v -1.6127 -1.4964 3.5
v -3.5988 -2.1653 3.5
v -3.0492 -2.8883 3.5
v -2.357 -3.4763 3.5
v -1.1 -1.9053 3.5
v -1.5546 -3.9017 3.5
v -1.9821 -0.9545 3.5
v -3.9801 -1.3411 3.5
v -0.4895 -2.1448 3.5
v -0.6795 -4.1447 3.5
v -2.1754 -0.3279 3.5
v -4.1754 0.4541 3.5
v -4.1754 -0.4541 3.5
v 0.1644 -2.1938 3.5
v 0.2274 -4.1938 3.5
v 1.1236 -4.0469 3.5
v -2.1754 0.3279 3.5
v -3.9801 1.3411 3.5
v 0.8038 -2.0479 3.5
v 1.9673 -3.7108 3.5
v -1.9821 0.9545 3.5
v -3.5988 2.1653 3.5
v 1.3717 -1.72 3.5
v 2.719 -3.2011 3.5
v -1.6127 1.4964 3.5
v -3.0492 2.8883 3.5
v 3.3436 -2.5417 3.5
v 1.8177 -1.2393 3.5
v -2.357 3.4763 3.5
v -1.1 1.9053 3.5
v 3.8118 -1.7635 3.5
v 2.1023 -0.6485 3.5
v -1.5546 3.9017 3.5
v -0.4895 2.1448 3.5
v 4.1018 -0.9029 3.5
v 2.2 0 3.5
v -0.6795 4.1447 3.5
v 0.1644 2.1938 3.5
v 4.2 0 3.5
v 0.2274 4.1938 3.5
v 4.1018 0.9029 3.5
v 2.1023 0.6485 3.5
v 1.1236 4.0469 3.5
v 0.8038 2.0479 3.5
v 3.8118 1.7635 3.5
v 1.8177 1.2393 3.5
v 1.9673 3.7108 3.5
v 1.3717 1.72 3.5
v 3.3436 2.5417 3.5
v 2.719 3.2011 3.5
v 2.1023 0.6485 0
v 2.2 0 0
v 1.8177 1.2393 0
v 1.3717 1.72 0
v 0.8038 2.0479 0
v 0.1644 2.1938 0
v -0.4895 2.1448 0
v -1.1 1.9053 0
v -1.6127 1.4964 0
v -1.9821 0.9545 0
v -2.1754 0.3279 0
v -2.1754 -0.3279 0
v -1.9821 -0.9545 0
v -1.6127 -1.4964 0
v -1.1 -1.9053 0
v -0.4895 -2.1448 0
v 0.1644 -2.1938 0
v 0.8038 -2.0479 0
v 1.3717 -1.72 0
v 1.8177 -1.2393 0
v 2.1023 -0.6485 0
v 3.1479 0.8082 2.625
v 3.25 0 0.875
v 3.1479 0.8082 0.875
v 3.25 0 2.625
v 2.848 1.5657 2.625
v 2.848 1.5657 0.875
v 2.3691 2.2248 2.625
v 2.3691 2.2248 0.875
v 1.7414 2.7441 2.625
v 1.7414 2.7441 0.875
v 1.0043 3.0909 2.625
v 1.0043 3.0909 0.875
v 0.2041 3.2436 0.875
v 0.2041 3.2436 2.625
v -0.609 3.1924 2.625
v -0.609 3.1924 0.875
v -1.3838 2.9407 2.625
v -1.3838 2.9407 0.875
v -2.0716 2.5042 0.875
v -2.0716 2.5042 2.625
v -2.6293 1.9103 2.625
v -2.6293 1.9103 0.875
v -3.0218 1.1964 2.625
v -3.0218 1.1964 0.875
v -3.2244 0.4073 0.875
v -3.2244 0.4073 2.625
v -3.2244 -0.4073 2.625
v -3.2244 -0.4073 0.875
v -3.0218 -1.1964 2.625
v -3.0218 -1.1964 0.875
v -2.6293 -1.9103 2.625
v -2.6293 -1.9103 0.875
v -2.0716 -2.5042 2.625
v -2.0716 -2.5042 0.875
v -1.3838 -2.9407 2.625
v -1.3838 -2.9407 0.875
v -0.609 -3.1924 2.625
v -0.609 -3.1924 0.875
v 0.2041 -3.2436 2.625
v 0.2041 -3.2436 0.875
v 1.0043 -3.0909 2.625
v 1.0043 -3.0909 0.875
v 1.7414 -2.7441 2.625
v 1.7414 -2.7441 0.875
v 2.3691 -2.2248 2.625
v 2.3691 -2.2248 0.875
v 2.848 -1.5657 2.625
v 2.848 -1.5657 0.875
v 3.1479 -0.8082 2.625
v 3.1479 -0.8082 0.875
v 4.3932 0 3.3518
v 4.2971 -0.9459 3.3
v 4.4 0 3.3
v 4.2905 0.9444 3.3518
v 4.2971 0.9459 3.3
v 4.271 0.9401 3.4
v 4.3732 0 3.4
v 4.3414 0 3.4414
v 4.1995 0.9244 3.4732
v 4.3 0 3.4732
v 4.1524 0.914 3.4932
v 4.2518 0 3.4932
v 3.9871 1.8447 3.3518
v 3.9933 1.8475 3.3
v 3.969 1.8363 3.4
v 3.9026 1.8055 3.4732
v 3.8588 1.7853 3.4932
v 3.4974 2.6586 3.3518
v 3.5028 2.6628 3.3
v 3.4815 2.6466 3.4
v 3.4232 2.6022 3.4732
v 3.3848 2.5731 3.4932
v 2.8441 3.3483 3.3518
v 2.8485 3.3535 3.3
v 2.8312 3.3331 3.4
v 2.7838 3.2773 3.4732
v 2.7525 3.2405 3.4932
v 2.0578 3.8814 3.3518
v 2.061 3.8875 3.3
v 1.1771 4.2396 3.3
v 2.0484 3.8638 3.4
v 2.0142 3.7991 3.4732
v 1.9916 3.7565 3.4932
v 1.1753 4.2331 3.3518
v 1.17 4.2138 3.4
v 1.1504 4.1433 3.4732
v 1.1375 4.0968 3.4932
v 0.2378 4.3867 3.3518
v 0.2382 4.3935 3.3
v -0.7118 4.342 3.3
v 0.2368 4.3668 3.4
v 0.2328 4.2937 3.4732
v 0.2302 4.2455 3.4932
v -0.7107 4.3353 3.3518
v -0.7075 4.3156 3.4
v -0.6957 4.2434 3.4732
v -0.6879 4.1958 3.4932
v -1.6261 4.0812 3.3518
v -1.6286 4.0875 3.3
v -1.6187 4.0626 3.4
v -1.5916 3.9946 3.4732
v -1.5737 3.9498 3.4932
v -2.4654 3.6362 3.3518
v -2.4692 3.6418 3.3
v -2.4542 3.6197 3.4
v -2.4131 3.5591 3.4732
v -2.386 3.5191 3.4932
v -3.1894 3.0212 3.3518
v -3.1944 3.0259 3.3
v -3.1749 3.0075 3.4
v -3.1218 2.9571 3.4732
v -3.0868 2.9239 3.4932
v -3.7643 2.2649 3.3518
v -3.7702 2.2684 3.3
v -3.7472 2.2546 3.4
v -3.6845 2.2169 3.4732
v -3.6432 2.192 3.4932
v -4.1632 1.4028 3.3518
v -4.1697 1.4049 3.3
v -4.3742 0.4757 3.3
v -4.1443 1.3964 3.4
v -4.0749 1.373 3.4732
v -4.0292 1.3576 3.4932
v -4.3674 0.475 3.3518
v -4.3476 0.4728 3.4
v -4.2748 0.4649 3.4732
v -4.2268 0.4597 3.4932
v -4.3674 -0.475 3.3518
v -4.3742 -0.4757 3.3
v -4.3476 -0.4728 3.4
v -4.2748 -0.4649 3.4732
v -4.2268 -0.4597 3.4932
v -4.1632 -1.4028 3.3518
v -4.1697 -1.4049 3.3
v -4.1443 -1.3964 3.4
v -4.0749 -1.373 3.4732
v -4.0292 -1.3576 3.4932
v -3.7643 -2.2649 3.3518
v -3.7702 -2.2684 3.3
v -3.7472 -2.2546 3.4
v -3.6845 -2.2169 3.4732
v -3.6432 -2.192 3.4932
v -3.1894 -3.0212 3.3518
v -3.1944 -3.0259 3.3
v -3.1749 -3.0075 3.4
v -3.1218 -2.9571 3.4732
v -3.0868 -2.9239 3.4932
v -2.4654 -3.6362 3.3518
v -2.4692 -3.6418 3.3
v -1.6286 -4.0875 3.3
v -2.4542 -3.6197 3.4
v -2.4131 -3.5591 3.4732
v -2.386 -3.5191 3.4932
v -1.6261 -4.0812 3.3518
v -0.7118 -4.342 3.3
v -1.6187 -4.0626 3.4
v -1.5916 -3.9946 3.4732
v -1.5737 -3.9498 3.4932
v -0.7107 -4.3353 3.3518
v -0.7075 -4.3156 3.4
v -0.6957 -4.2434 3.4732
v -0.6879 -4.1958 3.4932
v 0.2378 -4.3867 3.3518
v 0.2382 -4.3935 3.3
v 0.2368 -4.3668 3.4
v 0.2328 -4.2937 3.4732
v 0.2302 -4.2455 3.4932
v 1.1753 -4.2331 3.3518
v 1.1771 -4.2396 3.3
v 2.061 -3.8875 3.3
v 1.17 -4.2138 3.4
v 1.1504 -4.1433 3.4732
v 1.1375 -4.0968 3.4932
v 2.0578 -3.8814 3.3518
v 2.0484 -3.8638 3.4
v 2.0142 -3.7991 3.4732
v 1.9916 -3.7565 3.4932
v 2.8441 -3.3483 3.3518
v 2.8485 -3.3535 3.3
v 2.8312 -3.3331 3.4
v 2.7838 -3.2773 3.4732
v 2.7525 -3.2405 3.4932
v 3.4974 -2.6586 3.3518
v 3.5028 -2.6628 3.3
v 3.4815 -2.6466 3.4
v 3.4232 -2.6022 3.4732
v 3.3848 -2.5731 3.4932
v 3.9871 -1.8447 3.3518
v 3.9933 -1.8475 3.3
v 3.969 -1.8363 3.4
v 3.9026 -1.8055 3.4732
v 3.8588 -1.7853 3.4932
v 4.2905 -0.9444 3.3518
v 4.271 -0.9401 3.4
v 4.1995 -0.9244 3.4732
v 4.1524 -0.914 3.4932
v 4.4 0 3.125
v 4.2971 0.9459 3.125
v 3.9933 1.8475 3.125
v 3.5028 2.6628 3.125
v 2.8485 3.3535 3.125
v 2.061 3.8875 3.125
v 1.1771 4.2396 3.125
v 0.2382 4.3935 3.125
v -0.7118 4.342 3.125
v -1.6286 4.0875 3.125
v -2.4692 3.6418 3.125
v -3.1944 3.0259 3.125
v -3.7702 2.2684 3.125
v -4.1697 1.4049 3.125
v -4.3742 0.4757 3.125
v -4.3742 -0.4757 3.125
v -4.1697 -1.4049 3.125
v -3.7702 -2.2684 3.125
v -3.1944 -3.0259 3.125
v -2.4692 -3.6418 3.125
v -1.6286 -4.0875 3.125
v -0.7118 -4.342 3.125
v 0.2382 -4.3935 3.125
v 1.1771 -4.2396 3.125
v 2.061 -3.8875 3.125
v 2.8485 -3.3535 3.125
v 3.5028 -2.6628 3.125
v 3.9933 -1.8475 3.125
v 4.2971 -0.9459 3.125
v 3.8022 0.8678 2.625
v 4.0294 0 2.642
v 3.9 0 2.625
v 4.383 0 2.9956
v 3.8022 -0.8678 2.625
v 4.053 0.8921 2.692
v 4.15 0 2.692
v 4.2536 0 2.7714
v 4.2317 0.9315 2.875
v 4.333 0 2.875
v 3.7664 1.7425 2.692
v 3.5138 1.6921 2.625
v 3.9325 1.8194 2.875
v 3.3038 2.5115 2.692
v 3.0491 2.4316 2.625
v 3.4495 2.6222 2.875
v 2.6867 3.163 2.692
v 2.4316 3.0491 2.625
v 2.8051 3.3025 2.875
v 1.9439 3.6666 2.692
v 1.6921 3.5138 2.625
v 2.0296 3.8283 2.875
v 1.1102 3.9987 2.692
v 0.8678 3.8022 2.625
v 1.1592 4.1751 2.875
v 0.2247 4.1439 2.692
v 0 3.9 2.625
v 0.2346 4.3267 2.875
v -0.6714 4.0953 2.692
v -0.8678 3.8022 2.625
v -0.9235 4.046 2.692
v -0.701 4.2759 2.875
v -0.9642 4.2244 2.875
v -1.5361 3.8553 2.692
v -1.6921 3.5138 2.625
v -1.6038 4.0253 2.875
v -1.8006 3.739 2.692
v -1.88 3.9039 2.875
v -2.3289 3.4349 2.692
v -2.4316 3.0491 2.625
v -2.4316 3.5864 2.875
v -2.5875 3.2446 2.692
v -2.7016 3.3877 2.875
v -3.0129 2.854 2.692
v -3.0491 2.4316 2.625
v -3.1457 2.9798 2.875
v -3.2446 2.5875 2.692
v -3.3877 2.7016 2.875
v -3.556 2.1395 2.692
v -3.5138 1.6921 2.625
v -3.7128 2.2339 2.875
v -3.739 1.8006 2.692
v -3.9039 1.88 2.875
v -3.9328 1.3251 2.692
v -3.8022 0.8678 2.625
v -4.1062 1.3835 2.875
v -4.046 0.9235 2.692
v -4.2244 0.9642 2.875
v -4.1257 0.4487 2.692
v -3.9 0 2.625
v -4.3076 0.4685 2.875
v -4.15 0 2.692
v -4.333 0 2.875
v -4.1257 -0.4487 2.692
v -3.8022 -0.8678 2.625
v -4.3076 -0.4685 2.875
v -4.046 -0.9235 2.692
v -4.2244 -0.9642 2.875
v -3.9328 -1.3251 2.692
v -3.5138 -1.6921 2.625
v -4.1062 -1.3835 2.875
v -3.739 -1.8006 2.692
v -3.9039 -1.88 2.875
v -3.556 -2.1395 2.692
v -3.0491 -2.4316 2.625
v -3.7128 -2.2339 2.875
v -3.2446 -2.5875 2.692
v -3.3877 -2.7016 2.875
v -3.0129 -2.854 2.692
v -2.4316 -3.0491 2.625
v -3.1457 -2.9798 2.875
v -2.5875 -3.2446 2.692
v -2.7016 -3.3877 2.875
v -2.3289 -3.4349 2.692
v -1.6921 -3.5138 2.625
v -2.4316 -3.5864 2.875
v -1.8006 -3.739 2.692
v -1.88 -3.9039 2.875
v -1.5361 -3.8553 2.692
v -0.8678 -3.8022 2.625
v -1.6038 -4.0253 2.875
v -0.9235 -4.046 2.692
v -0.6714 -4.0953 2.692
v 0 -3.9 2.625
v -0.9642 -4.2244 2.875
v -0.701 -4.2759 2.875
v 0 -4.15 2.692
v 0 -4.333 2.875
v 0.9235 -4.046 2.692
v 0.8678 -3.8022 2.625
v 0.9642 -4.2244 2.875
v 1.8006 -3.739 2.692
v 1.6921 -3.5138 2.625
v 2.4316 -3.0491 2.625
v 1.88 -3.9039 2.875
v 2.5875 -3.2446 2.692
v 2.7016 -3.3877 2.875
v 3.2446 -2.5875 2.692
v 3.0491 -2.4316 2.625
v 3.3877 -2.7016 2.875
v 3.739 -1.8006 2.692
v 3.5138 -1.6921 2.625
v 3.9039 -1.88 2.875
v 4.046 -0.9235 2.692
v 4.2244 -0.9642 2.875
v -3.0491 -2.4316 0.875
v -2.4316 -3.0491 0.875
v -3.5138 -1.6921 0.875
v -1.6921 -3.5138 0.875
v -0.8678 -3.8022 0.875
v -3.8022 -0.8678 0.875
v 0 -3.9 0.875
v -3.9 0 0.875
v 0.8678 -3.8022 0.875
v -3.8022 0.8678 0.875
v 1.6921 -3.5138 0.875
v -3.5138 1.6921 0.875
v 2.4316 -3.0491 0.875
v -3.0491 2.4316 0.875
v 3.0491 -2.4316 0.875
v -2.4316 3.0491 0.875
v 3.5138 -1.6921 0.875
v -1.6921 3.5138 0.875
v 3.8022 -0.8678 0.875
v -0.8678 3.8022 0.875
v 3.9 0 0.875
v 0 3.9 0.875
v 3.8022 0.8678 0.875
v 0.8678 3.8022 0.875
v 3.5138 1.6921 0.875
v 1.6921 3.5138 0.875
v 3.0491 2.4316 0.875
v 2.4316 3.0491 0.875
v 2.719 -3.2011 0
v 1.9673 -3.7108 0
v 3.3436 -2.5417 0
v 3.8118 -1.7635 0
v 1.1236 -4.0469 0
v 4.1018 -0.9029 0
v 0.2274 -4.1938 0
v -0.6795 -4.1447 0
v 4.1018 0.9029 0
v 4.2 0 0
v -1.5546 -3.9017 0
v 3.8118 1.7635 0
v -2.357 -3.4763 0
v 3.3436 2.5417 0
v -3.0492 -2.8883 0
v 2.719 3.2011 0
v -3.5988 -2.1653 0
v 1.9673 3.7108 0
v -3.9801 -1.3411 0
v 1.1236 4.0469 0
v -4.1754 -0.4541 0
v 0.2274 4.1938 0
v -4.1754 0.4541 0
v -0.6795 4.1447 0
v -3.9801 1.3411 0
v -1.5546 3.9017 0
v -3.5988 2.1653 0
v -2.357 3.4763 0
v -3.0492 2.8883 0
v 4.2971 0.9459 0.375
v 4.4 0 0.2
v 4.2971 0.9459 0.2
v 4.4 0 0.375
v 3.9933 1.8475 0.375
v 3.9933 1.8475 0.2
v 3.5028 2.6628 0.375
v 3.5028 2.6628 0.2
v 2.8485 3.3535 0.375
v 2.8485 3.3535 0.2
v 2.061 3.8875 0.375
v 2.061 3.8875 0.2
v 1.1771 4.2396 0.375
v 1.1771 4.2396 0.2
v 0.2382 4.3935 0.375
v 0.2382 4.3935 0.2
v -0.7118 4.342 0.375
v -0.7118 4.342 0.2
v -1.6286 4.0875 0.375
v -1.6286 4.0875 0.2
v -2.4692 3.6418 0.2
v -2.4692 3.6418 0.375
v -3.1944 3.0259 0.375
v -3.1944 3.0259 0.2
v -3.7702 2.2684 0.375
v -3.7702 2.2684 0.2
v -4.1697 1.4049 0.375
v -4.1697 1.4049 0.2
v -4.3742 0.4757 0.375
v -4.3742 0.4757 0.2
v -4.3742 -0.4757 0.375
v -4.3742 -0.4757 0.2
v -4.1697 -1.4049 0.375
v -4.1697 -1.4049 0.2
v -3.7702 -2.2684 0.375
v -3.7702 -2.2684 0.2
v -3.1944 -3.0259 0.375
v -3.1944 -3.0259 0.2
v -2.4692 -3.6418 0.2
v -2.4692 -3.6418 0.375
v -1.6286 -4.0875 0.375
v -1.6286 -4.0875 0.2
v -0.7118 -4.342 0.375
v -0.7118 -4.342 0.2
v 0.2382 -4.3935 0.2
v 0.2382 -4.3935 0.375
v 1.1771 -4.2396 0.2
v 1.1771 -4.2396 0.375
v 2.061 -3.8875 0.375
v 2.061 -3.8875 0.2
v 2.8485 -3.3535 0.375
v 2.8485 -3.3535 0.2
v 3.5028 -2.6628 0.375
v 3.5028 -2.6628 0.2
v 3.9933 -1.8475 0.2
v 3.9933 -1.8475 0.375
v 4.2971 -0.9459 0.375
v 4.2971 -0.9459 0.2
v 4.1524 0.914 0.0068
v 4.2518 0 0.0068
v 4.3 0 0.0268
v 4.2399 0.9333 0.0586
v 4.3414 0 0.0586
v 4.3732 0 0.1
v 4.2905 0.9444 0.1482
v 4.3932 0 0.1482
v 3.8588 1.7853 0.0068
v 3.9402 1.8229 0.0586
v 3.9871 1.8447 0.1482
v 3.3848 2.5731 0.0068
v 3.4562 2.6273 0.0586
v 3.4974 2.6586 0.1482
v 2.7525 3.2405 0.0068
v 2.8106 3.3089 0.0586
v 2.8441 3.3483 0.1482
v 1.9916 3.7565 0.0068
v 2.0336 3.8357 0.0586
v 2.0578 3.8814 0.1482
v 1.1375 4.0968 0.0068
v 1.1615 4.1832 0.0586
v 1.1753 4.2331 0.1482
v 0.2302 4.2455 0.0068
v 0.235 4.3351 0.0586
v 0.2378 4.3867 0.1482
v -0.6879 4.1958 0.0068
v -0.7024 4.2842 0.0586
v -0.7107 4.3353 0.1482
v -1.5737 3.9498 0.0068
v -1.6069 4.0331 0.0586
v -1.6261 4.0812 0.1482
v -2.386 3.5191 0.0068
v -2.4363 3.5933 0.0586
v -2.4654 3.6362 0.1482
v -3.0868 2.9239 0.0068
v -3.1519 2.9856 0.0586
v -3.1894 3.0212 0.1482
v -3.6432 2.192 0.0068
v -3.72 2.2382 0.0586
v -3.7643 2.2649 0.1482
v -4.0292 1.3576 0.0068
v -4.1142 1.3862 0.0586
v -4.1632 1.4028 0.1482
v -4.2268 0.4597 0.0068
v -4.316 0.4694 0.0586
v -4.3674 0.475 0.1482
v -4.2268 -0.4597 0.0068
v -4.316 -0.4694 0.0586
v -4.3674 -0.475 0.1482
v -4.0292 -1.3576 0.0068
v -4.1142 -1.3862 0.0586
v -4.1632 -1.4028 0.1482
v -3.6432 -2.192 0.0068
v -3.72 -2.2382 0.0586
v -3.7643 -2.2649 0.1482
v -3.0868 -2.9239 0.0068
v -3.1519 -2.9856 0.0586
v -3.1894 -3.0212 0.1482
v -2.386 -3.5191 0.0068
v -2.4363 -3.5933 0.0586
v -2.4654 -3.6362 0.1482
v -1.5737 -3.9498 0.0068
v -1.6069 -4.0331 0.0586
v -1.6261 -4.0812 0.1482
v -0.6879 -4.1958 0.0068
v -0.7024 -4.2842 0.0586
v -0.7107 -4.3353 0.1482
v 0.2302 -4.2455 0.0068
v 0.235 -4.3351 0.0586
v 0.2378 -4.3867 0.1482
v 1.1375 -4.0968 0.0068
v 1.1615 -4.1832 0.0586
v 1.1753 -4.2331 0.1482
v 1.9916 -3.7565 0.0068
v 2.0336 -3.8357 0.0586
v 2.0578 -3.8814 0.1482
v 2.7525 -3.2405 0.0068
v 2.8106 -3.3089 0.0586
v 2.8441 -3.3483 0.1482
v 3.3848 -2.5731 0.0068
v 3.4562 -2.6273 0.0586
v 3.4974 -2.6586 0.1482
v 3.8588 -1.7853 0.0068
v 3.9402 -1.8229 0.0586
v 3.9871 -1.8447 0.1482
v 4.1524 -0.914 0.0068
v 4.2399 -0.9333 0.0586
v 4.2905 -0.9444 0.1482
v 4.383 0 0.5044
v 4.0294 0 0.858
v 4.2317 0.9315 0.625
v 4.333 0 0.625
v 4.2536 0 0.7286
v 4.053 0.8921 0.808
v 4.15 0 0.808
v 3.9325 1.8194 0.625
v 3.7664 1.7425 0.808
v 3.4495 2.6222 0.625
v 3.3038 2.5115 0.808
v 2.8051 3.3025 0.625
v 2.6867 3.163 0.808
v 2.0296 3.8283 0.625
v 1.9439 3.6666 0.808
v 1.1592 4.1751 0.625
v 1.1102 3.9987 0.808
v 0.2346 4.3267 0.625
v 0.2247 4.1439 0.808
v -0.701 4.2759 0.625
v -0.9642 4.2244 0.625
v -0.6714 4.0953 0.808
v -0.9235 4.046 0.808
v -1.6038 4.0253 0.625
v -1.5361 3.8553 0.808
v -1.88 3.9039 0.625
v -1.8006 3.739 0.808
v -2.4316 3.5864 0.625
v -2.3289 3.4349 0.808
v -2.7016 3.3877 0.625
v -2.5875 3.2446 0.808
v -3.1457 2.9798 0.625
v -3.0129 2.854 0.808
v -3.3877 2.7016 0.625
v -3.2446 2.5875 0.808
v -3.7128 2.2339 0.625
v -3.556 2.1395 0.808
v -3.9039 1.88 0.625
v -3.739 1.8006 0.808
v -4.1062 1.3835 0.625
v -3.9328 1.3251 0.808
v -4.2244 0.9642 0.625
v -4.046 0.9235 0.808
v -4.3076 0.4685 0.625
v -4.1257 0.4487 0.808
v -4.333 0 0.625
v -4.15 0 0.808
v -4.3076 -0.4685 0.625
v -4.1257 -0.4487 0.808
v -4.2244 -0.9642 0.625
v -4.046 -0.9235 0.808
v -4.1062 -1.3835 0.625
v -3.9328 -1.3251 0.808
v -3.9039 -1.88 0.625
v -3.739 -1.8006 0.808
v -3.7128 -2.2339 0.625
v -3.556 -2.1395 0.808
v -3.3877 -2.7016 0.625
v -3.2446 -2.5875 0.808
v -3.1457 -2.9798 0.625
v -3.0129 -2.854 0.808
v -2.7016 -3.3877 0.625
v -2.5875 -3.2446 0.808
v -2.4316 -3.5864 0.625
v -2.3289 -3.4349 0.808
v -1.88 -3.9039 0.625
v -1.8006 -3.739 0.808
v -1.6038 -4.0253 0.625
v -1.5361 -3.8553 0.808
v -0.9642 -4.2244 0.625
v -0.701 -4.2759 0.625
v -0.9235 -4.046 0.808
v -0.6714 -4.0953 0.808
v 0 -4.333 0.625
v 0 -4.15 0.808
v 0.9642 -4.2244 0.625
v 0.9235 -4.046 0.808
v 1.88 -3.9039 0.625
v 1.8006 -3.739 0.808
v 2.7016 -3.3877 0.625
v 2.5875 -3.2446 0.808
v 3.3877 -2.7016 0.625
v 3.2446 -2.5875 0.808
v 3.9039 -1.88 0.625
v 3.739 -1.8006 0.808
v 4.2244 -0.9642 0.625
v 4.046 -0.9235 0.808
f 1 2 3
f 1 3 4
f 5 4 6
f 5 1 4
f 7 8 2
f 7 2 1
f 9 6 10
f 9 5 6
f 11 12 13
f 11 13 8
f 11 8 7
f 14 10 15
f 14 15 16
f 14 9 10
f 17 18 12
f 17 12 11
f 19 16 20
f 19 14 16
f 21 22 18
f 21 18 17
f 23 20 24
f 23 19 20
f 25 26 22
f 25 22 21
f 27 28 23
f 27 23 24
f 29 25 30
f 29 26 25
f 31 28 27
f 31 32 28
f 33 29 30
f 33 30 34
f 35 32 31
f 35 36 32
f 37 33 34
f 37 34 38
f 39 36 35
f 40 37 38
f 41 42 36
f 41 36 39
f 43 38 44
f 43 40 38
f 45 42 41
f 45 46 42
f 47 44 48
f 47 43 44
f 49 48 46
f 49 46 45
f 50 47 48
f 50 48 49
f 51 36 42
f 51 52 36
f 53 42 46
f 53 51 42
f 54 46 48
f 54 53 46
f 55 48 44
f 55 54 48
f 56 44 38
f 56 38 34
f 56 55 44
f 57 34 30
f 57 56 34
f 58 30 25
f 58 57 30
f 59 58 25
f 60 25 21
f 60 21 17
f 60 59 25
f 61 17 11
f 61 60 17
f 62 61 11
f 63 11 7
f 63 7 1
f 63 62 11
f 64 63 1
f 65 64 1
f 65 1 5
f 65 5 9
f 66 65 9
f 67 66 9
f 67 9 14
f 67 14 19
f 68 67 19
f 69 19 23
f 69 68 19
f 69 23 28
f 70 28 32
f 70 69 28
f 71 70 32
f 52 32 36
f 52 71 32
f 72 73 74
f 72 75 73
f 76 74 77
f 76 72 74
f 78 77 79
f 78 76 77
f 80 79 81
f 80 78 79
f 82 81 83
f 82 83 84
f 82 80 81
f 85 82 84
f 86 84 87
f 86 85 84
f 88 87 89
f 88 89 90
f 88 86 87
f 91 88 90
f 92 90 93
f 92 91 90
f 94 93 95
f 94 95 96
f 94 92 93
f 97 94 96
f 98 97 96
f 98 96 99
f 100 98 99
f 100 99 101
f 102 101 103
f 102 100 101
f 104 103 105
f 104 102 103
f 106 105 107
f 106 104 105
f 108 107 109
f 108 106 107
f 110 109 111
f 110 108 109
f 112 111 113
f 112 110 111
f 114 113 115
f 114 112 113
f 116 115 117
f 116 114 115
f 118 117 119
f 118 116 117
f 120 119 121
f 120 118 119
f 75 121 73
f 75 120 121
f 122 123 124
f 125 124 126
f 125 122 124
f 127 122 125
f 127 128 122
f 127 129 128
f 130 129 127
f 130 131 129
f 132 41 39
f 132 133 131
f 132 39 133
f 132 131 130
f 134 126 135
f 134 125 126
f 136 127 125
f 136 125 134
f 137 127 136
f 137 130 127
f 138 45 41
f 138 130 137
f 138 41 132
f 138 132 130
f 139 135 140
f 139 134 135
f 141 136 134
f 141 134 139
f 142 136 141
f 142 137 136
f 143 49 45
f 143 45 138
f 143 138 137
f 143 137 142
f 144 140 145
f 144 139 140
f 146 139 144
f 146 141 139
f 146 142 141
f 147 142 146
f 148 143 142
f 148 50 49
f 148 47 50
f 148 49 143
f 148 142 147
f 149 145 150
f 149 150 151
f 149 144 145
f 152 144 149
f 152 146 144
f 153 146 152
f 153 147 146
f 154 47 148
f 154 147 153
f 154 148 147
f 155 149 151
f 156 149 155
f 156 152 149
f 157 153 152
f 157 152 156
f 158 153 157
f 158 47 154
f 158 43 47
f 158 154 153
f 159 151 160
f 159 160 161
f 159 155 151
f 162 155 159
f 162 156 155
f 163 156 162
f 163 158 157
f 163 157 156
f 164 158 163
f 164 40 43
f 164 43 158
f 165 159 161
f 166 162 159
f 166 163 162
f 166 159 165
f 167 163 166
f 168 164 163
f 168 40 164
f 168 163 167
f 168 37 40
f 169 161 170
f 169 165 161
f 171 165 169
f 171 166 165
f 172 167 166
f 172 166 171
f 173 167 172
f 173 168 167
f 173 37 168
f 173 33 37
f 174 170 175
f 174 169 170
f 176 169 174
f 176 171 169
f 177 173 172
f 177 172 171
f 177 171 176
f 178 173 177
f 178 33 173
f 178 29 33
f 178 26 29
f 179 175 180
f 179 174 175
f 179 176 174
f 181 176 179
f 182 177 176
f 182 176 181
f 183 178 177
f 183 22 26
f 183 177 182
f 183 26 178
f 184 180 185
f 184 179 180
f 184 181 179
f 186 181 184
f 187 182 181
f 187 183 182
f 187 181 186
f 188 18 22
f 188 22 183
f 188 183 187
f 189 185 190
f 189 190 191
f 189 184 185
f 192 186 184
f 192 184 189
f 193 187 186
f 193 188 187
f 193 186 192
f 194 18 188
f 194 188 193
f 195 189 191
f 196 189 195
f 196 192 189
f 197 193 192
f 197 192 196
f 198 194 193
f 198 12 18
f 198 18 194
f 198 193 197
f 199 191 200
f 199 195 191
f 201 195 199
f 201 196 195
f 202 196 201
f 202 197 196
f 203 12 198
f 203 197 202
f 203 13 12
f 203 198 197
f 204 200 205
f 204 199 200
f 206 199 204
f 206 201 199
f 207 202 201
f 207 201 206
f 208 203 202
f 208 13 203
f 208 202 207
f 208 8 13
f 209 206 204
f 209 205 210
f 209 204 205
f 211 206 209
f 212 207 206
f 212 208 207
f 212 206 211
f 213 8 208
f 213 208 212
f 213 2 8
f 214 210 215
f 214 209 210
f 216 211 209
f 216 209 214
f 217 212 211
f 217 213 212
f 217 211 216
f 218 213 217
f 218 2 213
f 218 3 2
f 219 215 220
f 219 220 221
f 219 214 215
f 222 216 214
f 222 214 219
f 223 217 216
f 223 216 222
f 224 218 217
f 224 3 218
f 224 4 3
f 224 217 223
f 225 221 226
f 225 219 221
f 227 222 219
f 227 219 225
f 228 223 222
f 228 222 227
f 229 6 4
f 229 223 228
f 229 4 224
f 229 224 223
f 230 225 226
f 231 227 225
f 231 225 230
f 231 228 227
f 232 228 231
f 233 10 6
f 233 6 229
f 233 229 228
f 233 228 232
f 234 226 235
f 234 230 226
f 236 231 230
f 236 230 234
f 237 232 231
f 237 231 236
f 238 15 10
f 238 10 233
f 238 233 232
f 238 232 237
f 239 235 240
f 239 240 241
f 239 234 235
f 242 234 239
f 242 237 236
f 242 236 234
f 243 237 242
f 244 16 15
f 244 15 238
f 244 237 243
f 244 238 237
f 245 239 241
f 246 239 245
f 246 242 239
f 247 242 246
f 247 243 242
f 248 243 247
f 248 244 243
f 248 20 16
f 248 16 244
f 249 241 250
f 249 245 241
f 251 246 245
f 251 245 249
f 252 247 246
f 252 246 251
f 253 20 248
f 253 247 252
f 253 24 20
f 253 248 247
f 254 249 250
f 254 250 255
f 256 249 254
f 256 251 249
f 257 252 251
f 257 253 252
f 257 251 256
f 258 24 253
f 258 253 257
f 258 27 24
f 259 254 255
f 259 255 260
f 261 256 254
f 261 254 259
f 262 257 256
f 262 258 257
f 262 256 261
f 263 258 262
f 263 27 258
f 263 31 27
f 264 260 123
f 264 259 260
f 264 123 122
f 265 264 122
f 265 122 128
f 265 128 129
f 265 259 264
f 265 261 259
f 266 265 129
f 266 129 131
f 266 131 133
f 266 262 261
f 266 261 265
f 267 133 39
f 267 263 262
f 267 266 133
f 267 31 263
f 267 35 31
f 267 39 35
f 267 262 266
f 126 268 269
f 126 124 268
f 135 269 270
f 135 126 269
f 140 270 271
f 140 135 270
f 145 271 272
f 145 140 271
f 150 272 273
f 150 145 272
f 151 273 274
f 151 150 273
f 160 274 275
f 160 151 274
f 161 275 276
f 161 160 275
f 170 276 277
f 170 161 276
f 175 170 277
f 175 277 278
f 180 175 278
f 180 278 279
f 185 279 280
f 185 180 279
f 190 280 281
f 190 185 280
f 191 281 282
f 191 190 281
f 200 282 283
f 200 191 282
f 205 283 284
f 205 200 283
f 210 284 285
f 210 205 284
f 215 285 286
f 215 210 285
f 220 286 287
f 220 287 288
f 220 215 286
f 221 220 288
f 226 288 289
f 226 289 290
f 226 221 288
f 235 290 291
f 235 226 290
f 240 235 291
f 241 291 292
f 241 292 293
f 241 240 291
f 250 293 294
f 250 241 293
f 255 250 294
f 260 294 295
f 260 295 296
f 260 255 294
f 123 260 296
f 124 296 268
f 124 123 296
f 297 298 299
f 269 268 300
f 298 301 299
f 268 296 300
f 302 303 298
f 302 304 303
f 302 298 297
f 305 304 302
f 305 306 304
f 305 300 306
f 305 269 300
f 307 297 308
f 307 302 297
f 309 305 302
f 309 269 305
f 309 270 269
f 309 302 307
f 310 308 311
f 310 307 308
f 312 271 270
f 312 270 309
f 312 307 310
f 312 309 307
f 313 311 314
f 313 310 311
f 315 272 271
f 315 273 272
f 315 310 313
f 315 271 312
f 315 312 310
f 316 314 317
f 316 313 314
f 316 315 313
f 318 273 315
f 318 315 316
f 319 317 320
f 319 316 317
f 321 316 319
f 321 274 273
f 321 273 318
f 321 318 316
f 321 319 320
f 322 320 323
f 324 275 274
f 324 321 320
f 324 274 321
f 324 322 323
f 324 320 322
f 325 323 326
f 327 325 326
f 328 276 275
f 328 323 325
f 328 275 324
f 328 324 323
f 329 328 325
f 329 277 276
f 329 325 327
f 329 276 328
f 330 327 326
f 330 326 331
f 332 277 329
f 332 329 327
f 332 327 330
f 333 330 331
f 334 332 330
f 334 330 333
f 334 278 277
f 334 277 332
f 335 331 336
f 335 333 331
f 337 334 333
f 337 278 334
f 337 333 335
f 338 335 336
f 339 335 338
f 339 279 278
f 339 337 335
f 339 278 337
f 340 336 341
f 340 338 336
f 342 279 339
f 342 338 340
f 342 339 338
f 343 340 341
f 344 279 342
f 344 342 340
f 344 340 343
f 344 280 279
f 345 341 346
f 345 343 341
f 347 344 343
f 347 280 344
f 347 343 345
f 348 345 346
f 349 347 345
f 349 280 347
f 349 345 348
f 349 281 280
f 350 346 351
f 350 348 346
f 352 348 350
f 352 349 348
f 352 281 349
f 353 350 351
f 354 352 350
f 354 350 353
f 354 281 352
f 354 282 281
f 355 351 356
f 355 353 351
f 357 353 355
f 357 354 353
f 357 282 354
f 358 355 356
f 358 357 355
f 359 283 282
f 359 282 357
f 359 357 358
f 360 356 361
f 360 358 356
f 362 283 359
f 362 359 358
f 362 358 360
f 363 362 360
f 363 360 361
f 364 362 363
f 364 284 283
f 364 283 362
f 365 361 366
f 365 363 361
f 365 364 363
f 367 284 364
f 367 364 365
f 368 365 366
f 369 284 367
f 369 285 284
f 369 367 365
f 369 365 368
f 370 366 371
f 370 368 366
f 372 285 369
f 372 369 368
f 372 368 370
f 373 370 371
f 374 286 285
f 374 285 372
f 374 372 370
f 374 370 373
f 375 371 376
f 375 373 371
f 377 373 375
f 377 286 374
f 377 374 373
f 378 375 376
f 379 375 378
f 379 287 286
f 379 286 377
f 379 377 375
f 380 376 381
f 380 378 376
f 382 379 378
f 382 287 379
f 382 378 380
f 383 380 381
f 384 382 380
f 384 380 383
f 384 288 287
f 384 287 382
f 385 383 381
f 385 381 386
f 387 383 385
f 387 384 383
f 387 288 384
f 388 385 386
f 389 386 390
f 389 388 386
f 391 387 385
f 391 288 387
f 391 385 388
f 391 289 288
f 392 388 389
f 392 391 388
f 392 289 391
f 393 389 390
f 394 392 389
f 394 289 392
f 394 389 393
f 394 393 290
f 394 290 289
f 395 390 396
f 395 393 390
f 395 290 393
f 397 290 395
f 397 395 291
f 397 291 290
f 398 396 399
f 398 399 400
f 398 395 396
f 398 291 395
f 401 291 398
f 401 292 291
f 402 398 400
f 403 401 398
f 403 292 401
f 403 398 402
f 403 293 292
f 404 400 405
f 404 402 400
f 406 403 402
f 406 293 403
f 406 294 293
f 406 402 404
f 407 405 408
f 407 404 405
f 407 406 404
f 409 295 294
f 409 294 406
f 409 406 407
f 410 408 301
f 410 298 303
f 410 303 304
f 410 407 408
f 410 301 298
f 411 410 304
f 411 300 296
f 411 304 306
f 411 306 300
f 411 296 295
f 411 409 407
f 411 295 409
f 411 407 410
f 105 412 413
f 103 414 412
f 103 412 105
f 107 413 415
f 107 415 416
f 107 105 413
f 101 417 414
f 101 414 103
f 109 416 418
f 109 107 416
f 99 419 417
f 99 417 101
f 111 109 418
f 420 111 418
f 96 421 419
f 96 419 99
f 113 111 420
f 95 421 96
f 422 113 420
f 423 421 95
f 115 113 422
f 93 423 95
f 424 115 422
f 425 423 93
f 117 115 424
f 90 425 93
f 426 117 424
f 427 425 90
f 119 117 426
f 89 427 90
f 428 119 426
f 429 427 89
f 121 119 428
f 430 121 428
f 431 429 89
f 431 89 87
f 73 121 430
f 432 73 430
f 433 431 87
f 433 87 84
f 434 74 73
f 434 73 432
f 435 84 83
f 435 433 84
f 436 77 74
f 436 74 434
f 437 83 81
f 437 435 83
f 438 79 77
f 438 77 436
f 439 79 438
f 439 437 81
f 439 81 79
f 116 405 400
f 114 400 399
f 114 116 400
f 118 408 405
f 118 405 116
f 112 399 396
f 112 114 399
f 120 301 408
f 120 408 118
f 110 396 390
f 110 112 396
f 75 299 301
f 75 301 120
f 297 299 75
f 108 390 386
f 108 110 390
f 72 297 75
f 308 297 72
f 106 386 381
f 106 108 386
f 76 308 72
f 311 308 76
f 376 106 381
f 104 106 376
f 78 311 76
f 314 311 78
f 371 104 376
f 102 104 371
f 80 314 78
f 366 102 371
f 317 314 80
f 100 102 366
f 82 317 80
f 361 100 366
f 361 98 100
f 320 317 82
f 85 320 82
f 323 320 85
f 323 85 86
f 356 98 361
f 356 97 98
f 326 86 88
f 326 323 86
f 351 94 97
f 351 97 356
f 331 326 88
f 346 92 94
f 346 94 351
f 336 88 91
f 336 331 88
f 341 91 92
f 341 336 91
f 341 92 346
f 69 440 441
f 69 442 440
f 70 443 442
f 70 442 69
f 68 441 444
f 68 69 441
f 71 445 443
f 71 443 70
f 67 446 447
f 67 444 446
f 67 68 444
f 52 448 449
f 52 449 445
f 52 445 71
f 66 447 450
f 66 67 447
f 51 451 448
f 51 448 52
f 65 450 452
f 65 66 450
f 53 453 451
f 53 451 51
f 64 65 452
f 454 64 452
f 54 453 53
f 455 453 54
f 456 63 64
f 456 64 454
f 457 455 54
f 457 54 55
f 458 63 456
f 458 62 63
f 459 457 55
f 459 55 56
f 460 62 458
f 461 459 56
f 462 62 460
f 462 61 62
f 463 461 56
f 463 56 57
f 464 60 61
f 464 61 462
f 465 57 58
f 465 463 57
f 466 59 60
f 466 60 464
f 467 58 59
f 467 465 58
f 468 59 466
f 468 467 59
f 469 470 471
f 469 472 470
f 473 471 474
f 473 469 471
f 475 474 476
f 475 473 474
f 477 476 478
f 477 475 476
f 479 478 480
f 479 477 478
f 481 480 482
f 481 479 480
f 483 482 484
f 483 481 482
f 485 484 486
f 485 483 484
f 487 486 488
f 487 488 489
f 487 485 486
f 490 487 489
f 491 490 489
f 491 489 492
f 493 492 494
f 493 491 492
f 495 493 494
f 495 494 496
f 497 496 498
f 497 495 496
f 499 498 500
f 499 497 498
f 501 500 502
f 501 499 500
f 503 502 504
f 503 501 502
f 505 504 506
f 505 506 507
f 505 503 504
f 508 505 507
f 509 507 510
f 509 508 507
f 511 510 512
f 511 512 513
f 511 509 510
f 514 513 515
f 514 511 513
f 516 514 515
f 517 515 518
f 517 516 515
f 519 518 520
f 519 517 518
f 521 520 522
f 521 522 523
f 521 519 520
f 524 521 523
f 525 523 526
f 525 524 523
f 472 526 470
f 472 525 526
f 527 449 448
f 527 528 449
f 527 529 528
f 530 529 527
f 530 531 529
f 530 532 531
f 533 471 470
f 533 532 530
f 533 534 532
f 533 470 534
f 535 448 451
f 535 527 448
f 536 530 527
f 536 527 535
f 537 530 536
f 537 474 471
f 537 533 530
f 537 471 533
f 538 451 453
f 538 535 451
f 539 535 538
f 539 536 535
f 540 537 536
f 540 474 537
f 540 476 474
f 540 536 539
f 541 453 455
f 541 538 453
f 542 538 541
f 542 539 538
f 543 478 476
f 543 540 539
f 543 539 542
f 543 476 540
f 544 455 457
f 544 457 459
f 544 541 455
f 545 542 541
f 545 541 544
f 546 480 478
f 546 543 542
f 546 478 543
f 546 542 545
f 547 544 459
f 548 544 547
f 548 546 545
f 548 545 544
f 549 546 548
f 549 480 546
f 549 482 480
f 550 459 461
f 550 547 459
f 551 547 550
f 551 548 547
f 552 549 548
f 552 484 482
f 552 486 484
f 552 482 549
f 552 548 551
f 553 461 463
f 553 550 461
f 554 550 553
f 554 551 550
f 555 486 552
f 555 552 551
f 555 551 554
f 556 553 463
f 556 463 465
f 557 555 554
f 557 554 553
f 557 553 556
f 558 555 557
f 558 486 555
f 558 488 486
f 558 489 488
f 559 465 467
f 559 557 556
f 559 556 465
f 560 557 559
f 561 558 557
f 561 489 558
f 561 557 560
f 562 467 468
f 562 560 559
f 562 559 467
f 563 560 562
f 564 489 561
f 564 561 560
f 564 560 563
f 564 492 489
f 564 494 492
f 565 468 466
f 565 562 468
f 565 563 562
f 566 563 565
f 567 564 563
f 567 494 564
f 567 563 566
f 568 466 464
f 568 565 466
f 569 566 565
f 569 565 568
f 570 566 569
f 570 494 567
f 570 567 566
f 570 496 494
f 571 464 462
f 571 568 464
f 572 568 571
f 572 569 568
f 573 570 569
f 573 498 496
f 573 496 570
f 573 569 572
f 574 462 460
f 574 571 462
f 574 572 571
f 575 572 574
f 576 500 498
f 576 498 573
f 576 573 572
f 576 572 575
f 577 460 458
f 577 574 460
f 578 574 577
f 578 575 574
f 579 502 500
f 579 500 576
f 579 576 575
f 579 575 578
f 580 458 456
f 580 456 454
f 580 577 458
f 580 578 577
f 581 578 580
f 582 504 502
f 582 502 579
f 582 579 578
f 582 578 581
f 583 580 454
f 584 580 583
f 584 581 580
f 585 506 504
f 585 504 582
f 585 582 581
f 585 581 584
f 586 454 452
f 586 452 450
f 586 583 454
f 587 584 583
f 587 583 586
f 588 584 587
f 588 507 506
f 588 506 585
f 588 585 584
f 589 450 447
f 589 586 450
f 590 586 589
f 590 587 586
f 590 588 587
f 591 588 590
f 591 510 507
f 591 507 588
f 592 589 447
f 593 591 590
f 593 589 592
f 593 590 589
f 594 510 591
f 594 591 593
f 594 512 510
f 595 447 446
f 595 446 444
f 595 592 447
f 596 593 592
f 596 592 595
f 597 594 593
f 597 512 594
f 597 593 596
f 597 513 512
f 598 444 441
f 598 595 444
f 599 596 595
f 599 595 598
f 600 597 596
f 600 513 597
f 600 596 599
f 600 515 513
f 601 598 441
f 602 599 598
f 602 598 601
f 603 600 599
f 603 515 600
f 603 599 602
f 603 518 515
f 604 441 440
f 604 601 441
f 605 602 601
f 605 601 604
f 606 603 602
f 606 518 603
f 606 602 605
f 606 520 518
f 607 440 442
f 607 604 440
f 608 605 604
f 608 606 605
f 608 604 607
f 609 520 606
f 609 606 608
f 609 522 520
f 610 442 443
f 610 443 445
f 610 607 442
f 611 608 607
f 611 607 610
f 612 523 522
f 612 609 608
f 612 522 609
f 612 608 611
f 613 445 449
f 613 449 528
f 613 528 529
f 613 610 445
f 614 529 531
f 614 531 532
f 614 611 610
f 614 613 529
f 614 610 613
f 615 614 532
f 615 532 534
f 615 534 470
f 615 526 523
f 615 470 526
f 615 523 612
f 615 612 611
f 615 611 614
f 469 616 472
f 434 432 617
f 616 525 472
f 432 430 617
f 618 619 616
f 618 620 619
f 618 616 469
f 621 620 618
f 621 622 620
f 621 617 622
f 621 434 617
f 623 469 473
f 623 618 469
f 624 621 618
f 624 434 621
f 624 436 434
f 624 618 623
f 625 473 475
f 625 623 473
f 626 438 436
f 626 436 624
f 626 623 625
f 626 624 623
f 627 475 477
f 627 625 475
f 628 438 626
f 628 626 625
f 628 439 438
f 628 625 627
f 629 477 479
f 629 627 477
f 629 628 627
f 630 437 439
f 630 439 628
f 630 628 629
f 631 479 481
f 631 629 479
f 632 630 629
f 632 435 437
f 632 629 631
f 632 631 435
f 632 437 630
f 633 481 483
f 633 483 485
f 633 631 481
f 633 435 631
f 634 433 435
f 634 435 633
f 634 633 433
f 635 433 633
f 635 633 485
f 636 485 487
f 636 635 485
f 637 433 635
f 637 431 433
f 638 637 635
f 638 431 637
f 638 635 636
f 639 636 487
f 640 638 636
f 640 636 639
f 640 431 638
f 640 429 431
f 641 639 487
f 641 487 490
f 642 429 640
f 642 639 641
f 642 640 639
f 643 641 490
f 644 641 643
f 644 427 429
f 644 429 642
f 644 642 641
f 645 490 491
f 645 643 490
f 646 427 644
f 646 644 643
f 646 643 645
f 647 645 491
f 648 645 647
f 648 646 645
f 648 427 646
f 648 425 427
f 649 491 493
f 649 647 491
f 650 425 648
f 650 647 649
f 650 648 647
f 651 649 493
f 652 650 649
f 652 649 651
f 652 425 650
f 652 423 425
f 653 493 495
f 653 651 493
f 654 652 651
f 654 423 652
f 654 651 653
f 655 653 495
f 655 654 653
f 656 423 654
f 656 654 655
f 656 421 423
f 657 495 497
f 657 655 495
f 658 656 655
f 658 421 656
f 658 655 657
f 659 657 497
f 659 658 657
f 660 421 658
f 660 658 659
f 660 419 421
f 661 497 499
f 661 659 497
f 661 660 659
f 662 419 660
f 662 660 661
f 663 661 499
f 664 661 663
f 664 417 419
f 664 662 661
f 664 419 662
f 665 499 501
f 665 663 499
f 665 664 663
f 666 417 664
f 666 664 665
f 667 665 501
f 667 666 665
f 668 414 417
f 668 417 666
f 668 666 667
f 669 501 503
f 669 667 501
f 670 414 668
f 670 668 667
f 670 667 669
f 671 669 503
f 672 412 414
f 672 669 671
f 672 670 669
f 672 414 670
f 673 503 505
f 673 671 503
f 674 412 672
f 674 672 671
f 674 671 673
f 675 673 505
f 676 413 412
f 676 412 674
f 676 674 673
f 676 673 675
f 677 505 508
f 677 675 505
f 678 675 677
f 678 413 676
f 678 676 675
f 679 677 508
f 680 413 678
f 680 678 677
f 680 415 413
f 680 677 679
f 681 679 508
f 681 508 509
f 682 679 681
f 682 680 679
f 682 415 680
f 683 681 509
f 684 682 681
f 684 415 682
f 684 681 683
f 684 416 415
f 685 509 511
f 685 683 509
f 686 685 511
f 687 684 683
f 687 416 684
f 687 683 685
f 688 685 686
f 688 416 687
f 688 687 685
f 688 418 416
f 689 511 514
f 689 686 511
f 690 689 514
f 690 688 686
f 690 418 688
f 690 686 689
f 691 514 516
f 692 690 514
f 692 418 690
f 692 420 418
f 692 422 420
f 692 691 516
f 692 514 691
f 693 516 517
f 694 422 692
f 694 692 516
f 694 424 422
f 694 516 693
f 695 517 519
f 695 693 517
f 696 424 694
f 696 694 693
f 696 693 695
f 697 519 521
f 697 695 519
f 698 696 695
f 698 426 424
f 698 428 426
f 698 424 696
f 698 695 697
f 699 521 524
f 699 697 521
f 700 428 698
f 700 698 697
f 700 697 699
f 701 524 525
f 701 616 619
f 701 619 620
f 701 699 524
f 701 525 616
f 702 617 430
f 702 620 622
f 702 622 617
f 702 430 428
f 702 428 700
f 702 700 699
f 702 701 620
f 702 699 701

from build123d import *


with BuildPart() as f1:
    # F0 (on Front) → F1 (revolve)
    with BuildSketch(Plane.XZ):
        with BuildLine():
            ThreePointArc((4.4, 3.3), (4.341421, 3.441421), (4.2, 3.5))
            Line((4.2, 3.5), (2.2, 3.5))
            Line((2.2, 3.5), (2.2, 0))
            Line((2.2, 0), (4.2, 0))
            ThreePointArc((4.2, 0), (4.341421, 0.058579), (4.4, 0.2))
            Line((4.4, 0.2), (4.4, 0.375))
            ThreePointArc((4.4, 0.375), (4.253553, 0.728553), (3.9, 0.875))
            Line((3.9, 0.875), (3.25, 0.875))
            Line((3.25, 0.875), (3.25, 2.625))
            Line((3.25, 2.625), (3.9, 2.625))
            ThreePointArc((3.9, 2.625), (4.253553, 2.771447), (4.4, 3.125))
            Line((4.4, 3.125), (4.4, 3.3))
        make_face()
    revolve(axis=Axis((0, 0, 1.683479), (0, 0, 1)))


solid = f1.part
